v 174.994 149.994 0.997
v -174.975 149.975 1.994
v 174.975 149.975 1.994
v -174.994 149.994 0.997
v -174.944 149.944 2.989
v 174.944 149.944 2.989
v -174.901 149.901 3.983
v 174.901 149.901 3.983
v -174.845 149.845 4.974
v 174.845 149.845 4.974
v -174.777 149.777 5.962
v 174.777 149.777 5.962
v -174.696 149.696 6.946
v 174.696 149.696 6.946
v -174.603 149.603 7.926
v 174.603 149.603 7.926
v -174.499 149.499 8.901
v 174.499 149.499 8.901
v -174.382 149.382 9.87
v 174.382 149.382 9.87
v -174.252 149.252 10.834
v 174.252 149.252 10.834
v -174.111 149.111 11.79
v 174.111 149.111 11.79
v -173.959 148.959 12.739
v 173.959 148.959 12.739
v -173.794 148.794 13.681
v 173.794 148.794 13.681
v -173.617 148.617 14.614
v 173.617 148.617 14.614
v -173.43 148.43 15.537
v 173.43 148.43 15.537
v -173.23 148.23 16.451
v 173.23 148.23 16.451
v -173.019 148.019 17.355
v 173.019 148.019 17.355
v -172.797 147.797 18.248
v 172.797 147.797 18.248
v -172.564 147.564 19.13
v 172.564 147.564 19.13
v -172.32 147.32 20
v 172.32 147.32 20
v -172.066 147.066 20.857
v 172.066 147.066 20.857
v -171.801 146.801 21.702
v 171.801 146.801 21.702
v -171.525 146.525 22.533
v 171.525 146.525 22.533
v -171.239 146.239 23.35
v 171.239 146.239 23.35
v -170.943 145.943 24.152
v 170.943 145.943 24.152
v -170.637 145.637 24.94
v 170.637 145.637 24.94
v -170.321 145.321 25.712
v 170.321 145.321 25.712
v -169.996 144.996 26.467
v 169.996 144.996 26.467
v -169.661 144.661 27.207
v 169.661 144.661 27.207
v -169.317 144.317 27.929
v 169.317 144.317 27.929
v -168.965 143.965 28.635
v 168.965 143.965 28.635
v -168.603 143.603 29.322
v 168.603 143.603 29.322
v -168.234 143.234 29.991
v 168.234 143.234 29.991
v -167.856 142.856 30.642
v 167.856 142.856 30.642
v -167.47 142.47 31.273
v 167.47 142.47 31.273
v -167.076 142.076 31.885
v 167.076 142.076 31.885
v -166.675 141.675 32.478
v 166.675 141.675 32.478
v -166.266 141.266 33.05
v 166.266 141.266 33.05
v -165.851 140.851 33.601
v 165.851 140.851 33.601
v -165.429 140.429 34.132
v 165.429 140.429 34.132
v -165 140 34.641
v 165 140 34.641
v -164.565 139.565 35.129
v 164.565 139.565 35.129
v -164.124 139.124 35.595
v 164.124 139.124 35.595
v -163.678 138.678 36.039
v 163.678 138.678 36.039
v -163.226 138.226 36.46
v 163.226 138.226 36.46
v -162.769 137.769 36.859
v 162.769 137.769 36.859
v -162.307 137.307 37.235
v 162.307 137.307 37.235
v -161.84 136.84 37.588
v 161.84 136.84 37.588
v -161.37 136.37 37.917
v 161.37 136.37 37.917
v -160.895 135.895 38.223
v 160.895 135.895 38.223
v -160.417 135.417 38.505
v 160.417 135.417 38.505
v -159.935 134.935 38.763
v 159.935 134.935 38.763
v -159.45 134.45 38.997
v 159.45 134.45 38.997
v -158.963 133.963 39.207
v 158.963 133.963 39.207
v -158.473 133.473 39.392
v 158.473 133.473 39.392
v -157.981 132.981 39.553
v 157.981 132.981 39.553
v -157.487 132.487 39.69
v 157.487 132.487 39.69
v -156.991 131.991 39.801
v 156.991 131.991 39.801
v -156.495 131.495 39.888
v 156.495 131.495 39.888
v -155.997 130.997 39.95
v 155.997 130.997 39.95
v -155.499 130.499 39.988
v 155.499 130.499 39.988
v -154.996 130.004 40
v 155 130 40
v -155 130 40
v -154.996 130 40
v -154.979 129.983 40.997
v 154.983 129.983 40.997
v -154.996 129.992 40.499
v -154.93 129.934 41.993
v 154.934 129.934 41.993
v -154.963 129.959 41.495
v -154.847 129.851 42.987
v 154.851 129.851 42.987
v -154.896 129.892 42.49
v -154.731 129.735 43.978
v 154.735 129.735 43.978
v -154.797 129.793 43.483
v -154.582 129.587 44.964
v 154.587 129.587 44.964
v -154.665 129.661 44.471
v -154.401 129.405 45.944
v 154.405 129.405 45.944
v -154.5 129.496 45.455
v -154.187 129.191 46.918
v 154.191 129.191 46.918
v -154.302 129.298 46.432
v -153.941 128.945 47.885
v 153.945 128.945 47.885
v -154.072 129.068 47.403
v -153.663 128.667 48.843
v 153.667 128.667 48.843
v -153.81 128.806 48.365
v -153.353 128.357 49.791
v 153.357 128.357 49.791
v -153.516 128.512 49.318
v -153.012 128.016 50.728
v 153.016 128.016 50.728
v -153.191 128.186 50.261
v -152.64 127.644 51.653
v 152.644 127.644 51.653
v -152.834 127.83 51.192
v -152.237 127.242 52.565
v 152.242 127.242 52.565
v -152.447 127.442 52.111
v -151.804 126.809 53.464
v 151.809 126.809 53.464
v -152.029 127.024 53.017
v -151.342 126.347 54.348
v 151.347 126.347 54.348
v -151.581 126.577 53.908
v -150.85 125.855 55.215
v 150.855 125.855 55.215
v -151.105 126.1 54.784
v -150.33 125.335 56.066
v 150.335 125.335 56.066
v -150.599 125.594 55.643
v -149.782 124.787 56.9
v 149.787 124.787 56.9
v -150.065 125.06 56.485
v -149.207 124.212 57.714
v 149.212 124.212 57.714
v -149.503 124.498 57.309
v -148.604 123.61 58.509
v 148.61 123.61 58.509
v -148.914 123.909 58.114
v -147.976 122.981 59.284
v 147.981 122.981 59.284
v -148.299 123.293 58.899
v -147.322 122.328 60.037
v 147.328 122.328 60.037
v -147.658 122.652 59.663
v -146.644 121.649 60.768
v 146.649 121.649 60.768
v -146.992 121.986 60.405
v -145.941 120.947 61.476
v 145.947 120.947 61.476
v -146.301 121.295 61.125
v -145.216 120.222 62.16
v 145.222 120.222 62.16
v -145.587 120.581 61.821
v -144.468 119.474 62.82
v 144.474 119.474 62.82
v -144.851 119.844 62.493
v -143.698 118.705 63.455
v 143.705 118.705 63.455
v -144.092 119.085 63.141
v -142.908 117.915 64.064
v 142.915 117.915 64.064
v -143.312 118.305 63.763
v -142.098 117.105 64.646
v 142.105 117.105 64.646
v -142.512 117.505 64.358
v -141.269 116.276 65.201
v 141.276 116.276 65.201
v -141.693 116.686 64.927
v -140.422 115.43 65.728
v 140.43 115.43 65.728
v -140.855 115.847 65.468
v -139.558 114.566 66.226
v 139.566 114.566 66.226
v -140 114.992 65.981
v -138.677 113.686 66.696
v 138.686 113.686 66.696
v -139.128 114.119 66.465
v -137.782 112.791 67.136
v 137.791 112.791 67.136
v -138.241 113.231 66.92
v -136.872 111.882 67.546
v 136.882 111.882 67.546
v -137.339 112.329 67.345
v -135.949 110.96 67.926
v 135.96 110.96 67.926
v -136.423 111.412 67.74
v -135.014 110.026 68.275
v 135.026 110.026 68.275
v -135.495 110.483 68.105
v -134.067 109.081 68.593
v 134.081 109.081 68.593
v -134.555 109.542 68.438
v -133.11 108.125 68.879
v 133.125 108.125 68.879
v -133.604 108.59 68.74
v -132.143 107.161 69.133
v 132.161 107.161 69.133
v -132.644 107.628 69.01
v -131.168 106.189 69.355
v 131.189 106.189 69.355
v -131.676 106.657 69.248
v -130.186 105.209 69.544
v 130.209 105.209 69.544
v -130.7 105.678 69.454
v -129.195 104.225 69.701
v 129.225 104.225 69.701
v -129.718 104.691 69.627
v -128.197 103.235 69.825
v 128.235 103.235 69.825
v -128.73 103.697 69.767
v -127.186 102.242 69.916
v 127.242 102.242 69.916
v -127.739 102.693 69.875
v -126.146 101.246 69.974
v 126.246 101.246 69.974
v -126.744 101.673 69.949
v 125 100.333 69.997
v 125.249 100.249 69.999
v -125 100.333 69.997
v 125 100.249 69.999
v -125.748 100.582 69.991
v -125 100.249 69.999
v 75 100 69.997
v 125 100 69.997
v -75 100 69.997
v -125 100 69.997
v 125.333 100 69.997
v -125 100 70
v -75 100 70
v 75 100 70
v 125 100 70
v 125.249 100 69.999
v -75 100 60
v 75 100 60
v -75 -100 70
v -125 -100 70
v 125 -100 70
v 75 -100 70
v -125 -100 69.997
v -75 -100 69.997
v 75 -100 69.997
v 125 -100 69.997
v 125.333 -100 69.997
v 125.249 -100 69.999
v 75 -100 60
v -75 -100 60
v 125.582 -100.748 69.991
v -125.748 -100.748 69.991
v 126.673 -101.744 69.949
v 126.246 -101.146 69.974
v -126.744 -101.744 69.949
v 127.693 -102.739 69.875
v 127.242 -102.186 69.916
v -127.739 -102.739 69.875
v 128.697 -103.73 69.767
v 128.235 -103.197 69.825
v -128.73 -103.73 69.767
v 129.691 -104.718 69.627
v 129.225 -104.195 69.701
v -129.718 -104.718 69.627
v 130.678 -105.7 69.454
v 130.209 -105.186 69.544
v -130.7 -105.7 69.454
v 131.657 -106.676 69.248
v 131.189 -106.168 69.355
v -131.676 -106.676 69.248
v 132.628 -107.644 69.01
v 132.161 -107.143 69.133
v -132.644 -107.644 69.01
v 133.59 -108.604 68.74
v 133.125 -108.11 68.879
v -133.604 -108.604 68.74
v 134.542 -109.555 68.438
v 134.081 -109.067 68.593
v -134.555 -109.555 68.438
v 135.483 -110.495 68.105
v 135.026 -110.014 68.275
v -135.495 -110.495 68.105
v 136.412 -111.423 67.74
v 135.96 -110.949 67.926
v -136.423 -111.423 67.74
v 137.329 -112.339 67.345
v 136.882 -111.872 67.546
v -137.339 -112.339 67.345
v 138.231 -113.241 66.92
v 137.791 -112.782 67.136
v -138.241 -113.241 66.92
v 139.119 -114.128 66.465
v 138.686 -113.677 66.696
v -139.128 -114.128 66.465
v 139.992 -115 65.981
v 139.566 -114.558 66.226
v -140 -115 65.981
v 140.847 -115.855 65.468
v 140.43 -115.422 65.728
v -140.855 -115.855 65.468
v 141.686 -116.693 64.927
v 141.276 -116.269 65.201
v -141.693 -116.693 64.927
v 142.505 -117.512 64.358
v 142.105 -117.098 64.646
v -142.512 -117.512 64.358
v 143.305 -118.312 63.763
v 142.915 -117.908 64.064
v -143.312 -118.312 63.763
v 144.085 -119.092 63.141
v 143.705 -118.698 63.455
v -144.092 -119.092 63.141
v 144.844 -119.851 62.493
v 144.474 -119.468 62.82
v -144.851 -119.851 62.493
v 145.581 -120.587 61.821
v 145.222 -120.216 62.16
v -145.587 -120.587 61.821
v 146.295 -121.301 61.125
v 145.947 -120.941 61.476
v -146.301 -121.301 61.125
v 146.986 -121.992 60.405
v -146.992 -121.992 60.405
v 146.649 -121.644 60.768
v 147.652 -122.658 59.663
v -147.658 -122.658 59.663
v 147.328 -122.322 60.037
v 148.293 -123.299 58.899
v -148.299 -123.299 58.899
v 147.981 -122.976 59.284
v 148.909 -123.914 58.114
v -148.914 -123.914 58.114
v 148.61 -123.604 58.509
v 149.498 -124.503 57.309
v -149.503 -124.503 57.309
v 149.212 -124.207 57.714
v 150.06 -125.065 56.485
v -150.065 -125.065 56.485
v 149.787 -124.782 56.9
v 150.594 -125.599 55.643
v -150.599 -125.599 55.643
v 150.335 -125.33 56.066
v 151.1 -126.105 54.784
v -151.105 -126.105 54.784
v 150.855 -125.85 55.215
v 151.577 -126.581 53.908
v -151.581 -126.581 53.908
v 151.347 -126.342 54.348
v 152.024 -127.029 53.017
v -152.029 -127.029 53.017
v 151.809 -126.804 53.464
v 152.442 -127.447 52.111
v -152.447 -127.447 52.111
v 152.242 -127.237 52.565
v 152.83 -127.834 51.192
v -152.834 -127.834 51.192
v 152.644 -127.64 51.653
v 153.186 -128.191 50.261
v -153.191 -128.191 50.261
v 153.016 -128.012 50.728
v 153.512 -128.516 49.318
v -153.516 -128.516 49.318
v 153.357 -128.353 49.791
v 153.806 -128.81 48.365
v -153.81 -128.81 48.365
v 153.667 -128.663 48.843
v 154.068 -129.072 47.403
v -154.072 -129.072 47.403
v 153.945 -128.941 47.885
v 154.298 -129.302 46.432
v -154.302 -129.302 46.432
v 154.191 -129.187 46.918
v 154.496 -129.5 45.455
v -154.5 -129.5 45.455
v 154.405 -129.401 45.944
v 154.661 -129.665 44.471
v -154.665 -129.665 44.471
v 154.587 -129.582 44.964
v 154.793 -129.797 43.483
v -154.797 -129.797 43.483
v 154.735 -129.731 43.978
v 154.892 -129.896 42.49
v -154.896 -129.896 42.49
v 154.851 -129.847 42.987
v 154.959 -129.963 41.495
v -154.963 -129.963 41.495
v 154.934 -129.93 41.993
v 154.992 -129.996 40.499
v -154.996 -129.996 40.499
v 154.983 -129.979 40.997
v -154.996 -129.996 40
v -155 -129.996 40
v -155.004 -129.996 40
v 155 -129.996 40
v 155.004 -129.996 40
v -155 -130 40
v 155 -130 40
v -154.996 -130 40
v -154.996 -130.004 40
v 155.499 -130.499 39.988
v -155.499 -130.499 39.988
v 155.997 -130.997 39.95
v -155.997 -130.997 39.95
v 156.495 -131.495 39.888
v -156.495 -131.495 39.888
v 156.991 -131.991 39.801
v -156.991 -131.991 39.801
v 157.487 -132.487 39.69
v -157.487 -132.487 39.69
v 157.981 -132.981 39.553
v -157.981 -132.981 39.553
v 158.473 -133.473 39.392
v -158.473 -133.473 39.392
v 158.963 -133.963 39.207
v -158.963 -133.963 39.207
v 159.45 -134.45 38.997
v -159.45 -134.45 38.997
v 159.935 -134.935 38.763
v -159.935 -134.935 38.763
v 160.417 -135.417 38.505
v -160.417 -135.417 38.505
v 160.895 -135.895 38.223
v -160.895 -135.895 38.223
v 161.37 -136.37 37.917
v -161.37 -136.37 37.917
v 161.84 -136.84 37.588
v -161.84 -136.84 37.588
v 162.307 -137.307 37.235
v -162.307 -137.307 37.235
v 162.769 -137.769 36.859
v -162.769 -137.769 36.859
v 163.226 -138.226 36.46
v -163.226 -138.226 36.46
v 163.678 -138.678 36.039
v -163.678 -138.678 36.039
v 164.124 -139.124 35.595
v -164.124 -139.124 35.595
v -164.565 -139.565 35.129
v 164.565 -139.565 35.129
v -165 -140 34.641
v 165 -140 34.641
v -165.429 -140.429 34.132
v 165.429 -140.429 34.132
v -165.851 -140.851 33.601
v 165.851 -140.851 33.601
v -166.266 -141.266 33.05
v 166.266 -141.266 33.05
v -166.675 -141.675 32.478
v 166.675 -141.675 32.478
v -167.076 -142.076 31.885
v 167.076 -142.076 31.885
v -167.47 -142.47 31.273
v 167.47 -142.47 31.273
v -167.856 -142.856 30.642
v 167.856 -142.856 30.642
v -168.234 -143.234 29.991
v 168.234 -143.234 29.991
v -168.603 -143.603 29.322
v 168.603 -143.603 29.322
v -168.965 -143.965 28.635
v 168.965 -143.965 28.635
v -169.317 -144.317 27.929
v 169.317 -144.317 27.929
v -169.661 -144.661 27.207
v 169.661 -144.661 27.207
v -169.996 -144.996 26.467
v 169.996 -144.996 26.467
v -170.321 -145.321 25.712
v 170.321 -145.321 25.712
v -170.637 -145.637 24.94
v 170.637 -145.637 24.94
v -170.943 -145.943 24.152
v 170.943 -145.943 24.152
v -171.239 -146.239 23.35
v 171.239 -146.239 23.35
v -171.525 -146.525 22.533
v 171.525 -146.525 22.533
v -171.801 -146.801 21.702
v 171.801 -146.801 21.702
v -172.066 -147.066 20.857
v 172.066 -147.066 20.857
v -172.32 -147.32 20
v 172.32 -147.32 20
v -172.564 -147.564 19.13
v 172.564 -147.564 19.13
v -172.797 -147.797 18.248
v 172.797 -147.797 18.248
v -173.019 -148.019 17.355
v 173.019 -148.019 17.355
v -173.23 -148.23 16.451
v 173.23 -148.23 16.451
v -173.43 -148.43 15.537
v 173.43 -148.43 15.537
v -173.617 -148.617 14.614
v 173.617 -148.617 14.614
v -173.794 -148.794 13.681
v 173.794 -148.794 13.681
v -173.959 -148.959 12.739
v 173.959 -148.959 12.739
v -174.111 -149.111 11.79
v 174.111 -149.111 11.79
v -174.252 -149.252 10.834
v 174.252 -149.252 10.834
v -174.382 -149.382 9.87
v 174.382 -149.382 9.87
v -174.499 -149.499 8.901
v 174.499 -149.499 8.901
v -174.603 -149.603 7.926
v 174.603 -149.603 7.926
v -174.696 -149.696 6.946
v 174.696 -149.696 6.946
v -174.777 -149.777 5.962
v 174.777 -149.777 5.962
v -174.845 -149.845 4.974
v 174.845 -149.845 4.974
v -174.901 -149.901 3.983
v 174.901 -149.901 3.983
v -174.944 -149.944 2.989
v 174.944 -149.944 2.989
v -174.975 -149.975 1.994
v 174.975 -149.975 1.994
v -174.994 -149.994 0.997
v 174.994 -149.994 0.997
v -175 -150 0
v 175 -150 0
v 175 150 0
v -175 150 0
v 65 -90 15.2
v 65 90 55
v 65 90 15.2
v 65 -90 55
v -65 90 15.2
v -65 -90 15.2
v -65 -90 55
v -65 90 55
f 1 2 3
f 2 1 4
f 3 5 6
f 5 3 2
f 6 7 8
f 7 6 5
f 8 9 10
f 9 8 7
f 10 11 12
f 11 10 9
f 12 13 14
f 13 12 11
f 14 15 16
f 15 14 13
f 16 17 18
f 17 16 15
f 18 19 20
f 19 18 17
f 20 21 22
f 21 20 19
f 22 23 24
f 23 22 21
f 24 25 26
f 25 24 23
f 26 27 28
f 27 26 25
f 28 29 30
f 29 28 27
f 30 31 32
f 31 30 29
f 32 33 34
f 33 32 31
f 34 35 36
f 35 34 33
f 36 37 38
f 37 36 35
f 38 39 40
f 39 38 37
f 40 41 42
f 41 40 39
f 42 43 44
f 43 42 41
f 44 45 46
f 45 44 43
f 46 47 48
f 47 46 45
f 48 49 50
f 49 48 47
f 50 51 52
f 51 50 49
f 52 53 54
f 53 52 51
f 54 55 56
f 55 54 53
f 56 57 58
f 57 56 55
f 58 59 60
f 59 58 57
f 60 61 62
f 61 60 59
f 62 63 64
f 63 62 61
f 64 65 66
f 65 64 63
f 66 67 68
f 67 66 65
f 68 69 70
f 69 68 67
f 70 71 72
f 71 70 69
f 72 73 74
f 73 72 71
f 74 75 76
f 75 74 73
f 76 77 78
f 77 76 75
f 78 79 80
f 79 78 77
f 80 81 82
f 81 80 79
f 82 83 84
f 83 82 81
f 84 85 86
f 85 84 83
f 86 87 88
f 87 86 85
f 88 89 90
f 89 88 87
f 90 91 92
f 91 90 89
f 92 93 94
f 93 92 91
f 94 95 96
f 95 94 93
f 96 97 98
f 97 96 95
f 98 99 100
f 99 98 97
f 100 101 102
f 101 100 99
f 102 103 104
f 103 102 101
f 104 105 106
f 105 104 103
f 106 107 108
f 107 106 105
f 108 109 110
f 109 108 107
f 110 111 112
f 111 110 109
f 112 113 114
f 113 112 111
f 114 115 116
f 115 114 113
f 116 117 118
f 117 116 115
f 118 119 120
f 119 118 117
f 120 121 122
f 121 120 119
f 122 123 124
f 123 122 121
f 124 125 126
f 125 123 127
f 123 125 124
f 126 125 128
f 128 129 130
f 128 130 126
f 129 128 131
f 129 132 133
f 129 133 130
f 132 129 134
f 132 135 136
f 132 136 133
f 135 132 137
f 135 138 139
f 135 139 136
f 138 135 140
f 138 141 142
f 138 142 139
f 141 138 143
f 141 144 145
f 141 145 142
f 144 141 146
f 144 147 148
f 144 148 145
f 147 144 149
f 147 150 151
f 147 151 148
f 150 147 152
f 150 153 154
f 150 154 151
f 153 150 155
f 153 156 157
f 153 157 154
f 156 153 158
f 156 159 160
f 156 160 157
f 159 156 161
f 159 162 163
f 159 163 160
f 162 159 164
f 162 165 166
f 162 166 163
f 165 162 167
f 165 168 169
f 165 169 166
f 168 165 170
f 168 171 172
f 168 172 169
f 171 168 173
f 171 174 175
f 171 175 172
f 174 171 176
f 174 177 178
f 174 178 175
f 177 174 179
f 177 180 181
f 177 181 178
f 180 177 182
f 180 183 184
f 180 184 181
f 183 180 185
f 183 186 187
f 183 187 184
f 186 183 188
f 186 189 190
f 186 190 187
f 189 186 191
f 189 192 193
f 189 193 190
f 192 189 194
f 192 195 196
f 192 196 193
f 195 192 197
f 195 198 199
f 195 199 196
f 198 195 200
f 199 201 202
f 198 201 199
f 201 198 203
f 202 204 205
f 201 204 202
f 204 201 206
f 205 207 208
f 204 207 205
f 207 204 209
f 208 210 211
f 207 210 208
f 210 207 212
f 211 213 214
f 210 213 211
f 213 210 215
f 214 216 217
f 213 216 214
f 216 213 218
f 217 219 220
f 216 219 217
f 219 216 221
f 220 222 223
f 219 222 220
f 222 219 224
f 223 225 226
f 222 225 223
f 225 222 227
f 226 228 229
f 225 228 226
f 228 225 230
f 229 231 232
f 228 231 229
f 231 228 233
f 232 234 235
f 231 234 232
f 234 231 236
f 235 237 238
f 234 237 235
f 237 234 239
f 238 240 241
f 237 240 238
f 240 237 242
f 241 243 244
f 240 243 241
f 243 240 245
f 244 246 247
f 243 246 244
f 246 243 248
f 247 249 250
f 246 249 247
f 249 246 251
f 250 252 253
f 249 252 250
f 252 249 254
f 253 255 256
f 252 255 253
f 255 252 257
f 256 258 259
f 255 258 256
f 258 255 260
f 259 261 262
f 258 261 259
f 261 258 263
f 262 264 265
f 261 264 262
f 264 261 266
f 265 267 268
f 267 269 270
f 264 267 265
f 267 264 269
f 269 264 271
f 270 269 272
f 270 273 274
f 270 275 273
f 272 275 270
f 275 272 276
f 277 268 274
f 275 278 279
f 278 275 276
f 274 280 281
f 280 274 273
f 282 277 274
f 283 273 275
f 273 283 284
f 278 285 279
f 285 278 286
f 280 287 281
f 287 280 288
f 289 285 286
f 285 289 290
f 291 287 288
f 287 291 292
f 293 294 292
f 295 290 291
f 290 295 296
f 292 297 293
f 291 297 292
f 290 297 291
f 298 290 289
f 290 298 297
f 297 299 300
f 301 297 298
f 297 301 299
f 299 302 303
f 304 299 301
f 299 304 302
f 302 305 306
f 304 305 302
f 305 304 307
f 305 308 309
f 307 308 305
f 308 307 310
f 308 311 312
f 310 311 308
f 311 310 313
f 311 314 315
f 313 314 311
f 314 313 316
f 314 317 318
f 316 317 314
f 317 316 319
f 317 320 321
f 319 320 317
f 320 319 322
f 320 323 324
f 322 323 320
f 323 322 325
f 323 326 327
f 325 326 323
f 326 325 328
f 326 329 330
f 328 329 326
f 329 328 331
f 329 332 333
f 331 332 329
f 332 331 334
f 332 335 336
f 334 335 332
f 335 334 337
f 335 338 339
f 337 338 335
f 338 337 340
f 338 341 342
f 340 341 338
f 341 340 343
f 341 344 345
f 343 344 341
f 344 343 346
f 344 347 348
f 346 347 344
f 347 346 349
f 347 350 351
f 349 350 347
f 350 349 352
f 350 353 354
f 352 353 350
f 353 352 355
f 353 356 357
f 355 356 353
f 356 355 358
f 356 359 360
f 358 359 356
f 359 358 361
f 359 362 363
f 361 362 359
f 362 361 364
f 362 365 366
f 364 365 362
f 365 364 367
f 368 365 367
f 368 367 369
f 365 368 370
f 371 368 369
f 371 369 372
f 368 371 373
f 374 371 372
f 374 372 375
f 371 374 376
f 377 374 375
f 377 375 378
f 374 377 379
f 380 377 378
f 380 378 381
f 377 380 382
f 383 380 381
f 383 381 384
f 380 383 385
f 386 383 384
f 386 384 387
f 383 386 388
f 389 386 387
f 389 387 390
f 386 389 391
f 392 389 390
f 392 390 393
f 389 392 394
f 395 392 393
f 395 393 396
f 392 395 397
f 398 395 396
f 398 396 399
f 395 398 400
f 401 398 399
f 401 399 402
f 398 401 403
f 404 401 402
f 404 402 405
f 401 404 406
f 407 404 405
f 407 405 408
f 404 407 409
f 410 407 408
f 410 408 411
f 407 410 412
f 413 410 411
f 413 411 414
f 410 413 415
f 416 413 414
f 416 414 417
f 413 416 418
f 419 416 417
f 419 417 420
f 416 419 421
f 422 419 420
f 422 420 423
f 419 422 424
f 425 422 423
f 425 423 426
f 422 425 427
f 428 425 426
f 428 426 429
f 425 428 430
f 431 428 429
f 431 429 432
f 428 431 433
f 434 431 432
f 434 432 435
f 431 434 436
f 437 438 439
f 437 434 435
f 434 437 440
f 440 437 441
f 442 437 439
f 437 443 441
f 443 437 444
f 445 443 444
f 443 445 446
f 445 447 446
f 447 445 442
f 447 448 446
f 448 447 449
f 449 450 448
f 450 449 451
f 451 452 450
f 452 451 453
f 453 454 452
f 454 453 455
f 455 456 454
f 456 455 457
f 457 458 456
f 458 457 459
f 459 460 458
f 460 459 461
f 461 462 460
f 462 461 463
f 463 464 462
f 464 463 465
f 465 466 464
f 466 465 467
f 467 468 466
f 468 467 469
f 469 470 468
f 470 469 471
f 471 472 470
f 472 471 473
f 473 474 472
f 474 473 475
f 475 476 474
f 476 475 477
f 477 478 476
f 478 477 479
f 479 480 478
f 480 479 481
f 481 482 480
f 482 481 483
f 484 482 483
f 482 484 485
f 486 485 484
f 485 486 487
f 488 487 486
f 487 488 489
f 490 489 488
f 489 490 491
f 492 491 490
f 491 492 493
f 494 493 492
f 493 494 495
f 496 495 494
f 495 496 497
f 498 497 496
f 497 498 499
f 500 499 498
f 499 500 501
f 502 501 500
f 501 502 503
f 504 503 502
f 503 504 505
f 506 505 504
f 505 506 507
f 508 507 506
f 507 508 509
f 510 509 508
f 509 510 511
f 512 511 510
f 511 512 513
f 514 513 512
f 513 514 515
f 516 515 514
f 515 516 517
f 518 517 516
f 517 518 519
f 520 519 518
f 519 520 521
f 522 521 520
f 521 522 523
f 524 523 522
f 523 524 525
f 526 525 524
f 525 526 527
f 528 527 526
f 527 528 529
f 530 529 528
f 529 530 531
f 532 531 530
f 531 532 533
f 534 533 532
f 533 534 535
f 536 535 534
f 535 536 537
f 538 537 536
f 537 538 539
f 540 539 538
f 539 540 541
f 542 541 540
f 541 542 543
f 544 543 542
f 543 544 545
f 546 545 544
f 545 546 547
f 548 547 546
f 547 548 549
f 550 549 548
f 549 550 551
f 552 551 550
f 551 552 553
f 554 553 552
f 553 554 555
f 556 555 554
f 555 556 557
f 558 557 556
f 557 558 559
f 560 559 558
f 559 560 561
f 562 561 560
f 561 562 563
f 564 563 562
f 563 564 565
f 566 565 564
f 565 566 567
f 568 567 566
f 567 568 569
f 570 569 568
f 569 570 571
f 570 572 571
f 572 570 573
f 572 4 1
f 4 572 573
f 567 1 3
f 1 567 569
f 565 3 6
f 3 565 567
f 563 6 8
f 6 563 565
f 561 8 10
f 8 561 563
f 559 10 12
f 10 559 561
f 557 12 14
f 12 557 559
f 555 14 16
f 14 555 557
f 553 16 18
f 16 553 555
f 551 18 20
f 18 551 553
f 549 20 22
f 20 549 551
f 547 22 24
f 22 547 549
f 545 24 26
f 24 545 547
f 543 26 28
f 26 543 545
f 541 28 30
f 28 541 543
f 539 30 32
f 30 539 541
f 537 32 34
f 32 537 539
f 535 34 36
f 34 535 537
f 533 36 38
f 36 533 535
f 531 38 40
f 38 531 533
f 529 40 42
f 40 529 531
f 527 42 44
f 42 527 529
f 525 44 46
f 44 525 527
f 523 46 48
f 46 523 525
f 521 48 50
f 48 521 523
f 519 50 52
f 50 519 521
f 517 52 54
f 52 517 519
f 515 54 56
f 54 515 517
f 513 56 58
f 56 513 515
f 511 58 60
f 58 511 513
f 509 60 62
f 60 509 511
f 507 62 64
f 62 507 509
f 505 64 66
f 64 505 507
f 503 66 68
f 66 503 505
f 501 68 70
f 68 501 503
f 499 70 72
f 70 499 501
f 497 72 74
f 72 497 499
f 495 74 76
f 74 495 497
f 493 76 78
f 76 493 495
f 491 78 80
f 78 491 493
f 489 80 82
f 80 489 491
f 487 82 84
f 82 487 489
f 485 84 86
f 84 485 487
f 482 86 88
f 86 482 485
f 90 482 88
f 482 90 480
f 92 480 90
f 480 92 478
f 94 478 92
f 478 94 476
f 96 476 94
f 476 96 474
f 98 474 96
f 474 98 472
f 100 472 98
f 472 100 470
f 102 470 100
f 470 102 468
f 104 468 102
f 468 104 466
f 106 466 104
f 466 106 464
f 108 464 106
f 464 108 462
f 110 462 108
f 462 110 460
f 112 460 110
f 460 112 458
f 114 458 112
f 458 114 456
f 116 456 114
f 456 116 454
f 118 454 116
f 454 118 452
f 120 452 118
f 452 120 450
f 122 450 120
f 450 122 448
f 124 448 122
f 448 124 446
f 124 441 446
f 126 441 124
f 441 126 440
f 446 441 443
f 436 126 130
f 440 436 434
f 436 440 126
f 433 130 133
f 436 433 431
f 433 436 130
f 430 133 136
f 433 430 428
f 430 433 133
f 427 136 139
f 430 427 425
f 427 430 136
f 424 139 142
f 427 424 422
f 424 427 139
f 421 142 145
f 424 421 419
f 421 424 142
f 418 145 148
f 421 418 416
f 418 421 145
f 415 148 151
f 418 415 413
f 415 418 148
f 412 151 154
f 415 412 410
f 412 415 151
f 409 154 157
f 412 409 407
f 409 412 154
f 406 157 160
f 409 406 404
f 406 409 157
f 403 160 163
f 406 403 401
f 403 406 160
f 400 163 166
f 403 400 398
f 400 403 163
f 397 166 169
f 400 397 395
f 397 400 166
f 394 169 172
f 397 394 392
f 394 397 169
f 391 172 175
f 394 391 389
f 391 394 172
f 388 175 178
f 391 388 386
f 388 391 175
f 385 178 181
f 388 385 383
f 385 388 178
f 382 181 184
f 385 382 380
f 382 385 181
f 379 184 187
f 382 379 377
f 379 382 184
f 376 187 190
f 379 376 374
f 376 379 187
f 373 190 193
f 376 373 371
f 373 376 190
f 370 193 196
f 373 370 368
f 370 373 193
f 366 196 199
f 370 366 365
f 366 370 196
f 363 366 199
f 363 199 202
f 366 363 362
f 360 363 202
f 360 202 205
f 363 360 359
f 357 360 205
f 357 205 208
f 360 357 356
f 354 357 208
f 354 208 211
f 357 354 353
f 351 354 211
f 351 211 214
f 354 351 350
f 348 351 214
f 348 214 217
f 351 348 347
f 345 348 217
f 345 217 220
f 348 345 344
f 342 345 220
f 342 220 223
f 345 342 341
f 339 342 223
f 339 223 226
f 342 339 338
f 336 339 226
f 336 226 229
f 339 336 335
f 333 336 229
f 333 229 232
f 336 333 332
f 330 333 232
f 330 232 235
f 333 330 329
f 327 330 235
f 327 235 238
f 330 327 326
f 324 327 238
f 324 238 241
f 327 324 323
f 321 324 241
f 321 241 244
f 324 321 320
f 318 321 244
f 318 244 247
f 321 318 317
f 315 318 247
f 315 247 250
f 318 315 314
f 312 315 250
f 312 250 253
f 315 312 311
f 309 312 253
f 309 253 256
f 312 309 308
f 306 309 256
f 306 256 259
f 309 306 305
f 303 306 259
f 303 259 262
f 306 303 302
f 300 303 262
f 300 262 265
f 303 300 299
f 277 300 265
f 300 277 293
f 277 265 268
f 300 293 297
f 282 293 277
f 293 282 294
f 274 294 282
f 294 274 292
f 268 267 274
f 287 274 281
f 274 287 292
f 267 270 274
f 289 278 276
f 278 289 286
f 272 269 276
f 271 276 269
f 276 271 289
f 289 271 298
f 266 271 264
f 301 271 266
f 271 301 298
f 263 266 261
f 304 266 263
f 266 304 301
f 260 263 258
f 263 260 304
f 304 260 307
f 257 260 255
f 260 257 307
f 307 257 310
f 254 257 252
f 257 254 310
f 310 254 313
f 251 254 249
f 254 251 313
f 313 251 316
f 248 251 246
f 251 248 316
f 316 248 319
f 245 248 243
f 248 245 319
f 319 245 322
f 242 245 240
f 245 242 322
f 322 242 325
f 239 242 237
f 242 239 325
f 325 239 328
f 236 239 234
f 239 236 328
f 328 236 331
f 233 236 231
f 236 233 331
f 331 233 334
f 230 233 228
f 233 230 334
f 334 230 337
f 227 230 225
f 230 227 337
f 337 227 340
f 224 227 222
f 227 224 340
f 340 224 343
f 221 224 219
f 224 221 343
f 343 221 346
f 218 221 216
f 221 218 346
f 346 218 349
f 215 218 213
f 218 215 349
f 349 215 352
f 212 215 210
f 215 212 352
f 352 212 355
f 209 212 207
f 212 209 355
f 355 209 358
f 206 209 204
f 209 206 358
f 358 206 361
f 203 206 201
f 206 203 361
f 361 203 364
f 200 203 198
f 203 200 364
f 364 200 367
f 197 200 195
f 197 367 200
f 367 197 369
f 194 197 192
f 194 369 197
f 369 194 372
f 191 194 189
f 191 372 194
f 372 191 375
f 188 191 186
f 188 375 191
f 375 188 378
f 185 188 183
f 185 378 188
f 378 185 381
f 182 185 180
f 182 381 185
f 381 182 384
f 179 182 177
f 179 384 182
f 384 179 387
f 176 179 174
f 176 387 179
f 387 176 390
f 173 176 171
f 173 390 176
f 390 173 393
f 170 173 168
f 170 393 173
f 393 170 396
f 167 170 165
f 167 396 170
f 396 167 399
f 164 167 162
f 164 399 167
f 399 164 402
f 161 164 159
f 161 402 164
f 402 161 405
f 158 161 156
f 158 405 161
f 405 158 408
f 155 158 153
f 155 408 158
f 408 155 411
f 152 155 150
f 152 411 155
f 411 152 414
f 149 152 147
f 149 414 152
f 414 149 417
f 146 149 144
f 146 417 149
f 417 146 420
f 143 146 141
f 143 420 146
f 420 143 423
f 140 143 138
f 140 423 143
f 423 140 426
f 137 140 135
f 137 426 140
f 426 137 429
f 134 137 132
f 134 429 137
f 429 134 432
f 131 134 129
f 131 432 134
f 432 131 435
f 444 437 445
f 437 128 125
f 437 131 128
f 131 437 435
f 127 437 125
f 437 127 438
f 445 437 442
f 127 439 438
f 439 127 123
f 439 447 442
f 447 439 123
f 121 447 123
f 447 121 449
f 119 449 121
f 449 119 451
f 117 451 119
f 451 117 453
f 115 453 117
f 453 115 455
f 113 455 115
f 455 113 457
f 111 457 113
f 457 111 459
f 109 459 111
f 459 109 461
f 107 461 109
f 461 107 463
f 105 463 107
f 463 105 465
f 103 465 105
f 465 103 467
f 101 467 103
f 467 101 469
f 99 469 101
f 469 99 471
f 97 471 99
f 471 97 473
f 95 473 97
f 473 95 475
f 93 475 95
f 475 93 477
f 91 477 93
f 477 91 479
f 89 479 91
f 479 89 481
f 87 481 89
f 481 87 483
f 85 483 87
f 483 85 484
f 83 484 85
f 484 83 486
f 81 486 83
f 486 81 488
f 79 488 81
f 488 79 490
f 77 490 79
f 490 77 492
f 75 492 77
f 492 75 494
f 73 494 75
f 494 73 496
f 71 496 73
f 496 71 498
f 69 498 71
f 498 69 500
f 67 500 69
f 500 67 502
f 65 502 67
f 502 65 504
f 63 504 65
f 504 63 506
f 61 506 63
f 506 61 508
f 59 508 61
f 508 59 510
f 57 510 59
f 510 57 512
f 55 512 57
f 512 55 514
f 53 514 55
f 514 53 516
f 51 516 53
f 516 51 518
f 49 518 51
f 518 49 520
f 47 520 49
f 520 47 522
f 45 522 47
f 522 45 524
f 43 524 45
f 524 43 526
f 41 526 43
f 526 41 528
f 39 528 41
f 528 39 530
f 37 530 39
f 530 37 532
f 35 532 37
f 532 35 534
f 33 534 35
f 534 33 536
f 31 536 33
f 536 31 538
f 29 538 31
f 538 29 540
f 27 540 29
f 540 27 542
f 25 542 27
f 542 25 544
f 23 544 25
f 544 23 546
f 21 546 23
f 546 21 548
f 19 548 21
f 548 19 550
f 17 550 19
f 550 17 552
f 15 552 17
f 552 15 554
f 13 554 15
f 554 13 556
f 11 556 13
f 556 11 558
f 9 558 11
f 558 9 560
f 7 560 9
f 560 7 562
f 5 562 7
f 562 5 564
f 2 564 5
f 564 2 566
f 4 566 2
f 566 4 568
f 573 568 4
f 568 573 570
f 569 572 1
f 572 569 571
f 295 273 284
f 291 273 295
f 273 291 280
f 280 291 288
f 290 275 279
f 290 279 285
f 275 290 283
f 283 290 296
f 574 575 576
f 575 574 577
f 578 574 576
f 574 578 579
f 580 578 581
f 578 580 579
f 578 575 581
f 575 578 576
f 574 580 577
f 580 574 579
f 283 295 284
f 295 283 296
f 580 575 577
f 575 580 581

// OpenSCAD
$fa = 1;
$fs = 1;

module profile(w, h, smallr) {
	lowerScale = 0.5;
	difference() {
		union() {
			translate([-w/2, 0]) square([w, h]);
			translate([-(w+smallr)/2, 0]) square([w + smallr, h - smallr]);

			translate([w/2, h - smallr]) circle(smallr);
			translate([w/2 + smallr, 0]) scale([lowerScale, 1]) circle(h - smallr);

			translate([-w/2, h - smallr]) circle(smallr);
			translate([-w/2 - smallr, 0]) scale([lowerScale, 1]) circle(h - smallr);
		}
		translate([-w, -2*h]) square([2*w, 2*h]);
	}
}

module base(w, h, z) {
	intersection() {
		rotate([90, 0, 90])
			linear_extrude(h*3,  center=true)
				profile(h, z, z/7 * 3);

		rotate([90, 0, 0])
			linear_extrude(w*3, center= true)
				profile(w, z, z / 7 * 3);
	}
}

module main() {

	sheetW = 150;

	baseW = sheetW + 2 * 50;
	baseH = 200;

	h = 70;
	plateHeight = 15;
	weightHeight = 40;
	plateMargin = 20;

	difference() {
		base(baseW, baseH, h);
		translate([0, 0, h - plateHeight/2 + 0.1])
			cube([sheetW, baseH, plateHeight], center = true);
		translate([0, 0, h - plateHeight - weightHeight/2 + 0.2])
			cube([sheetW - plateMargin, baseH - plateMargin, weightHeight], center = true);
	}

	lidThickness = 5;
	#translate([0, 0, h - plateHeight + lidThickness / 2])
		cube([baseW, baseH, lidThickness], center = true);
}

main();
